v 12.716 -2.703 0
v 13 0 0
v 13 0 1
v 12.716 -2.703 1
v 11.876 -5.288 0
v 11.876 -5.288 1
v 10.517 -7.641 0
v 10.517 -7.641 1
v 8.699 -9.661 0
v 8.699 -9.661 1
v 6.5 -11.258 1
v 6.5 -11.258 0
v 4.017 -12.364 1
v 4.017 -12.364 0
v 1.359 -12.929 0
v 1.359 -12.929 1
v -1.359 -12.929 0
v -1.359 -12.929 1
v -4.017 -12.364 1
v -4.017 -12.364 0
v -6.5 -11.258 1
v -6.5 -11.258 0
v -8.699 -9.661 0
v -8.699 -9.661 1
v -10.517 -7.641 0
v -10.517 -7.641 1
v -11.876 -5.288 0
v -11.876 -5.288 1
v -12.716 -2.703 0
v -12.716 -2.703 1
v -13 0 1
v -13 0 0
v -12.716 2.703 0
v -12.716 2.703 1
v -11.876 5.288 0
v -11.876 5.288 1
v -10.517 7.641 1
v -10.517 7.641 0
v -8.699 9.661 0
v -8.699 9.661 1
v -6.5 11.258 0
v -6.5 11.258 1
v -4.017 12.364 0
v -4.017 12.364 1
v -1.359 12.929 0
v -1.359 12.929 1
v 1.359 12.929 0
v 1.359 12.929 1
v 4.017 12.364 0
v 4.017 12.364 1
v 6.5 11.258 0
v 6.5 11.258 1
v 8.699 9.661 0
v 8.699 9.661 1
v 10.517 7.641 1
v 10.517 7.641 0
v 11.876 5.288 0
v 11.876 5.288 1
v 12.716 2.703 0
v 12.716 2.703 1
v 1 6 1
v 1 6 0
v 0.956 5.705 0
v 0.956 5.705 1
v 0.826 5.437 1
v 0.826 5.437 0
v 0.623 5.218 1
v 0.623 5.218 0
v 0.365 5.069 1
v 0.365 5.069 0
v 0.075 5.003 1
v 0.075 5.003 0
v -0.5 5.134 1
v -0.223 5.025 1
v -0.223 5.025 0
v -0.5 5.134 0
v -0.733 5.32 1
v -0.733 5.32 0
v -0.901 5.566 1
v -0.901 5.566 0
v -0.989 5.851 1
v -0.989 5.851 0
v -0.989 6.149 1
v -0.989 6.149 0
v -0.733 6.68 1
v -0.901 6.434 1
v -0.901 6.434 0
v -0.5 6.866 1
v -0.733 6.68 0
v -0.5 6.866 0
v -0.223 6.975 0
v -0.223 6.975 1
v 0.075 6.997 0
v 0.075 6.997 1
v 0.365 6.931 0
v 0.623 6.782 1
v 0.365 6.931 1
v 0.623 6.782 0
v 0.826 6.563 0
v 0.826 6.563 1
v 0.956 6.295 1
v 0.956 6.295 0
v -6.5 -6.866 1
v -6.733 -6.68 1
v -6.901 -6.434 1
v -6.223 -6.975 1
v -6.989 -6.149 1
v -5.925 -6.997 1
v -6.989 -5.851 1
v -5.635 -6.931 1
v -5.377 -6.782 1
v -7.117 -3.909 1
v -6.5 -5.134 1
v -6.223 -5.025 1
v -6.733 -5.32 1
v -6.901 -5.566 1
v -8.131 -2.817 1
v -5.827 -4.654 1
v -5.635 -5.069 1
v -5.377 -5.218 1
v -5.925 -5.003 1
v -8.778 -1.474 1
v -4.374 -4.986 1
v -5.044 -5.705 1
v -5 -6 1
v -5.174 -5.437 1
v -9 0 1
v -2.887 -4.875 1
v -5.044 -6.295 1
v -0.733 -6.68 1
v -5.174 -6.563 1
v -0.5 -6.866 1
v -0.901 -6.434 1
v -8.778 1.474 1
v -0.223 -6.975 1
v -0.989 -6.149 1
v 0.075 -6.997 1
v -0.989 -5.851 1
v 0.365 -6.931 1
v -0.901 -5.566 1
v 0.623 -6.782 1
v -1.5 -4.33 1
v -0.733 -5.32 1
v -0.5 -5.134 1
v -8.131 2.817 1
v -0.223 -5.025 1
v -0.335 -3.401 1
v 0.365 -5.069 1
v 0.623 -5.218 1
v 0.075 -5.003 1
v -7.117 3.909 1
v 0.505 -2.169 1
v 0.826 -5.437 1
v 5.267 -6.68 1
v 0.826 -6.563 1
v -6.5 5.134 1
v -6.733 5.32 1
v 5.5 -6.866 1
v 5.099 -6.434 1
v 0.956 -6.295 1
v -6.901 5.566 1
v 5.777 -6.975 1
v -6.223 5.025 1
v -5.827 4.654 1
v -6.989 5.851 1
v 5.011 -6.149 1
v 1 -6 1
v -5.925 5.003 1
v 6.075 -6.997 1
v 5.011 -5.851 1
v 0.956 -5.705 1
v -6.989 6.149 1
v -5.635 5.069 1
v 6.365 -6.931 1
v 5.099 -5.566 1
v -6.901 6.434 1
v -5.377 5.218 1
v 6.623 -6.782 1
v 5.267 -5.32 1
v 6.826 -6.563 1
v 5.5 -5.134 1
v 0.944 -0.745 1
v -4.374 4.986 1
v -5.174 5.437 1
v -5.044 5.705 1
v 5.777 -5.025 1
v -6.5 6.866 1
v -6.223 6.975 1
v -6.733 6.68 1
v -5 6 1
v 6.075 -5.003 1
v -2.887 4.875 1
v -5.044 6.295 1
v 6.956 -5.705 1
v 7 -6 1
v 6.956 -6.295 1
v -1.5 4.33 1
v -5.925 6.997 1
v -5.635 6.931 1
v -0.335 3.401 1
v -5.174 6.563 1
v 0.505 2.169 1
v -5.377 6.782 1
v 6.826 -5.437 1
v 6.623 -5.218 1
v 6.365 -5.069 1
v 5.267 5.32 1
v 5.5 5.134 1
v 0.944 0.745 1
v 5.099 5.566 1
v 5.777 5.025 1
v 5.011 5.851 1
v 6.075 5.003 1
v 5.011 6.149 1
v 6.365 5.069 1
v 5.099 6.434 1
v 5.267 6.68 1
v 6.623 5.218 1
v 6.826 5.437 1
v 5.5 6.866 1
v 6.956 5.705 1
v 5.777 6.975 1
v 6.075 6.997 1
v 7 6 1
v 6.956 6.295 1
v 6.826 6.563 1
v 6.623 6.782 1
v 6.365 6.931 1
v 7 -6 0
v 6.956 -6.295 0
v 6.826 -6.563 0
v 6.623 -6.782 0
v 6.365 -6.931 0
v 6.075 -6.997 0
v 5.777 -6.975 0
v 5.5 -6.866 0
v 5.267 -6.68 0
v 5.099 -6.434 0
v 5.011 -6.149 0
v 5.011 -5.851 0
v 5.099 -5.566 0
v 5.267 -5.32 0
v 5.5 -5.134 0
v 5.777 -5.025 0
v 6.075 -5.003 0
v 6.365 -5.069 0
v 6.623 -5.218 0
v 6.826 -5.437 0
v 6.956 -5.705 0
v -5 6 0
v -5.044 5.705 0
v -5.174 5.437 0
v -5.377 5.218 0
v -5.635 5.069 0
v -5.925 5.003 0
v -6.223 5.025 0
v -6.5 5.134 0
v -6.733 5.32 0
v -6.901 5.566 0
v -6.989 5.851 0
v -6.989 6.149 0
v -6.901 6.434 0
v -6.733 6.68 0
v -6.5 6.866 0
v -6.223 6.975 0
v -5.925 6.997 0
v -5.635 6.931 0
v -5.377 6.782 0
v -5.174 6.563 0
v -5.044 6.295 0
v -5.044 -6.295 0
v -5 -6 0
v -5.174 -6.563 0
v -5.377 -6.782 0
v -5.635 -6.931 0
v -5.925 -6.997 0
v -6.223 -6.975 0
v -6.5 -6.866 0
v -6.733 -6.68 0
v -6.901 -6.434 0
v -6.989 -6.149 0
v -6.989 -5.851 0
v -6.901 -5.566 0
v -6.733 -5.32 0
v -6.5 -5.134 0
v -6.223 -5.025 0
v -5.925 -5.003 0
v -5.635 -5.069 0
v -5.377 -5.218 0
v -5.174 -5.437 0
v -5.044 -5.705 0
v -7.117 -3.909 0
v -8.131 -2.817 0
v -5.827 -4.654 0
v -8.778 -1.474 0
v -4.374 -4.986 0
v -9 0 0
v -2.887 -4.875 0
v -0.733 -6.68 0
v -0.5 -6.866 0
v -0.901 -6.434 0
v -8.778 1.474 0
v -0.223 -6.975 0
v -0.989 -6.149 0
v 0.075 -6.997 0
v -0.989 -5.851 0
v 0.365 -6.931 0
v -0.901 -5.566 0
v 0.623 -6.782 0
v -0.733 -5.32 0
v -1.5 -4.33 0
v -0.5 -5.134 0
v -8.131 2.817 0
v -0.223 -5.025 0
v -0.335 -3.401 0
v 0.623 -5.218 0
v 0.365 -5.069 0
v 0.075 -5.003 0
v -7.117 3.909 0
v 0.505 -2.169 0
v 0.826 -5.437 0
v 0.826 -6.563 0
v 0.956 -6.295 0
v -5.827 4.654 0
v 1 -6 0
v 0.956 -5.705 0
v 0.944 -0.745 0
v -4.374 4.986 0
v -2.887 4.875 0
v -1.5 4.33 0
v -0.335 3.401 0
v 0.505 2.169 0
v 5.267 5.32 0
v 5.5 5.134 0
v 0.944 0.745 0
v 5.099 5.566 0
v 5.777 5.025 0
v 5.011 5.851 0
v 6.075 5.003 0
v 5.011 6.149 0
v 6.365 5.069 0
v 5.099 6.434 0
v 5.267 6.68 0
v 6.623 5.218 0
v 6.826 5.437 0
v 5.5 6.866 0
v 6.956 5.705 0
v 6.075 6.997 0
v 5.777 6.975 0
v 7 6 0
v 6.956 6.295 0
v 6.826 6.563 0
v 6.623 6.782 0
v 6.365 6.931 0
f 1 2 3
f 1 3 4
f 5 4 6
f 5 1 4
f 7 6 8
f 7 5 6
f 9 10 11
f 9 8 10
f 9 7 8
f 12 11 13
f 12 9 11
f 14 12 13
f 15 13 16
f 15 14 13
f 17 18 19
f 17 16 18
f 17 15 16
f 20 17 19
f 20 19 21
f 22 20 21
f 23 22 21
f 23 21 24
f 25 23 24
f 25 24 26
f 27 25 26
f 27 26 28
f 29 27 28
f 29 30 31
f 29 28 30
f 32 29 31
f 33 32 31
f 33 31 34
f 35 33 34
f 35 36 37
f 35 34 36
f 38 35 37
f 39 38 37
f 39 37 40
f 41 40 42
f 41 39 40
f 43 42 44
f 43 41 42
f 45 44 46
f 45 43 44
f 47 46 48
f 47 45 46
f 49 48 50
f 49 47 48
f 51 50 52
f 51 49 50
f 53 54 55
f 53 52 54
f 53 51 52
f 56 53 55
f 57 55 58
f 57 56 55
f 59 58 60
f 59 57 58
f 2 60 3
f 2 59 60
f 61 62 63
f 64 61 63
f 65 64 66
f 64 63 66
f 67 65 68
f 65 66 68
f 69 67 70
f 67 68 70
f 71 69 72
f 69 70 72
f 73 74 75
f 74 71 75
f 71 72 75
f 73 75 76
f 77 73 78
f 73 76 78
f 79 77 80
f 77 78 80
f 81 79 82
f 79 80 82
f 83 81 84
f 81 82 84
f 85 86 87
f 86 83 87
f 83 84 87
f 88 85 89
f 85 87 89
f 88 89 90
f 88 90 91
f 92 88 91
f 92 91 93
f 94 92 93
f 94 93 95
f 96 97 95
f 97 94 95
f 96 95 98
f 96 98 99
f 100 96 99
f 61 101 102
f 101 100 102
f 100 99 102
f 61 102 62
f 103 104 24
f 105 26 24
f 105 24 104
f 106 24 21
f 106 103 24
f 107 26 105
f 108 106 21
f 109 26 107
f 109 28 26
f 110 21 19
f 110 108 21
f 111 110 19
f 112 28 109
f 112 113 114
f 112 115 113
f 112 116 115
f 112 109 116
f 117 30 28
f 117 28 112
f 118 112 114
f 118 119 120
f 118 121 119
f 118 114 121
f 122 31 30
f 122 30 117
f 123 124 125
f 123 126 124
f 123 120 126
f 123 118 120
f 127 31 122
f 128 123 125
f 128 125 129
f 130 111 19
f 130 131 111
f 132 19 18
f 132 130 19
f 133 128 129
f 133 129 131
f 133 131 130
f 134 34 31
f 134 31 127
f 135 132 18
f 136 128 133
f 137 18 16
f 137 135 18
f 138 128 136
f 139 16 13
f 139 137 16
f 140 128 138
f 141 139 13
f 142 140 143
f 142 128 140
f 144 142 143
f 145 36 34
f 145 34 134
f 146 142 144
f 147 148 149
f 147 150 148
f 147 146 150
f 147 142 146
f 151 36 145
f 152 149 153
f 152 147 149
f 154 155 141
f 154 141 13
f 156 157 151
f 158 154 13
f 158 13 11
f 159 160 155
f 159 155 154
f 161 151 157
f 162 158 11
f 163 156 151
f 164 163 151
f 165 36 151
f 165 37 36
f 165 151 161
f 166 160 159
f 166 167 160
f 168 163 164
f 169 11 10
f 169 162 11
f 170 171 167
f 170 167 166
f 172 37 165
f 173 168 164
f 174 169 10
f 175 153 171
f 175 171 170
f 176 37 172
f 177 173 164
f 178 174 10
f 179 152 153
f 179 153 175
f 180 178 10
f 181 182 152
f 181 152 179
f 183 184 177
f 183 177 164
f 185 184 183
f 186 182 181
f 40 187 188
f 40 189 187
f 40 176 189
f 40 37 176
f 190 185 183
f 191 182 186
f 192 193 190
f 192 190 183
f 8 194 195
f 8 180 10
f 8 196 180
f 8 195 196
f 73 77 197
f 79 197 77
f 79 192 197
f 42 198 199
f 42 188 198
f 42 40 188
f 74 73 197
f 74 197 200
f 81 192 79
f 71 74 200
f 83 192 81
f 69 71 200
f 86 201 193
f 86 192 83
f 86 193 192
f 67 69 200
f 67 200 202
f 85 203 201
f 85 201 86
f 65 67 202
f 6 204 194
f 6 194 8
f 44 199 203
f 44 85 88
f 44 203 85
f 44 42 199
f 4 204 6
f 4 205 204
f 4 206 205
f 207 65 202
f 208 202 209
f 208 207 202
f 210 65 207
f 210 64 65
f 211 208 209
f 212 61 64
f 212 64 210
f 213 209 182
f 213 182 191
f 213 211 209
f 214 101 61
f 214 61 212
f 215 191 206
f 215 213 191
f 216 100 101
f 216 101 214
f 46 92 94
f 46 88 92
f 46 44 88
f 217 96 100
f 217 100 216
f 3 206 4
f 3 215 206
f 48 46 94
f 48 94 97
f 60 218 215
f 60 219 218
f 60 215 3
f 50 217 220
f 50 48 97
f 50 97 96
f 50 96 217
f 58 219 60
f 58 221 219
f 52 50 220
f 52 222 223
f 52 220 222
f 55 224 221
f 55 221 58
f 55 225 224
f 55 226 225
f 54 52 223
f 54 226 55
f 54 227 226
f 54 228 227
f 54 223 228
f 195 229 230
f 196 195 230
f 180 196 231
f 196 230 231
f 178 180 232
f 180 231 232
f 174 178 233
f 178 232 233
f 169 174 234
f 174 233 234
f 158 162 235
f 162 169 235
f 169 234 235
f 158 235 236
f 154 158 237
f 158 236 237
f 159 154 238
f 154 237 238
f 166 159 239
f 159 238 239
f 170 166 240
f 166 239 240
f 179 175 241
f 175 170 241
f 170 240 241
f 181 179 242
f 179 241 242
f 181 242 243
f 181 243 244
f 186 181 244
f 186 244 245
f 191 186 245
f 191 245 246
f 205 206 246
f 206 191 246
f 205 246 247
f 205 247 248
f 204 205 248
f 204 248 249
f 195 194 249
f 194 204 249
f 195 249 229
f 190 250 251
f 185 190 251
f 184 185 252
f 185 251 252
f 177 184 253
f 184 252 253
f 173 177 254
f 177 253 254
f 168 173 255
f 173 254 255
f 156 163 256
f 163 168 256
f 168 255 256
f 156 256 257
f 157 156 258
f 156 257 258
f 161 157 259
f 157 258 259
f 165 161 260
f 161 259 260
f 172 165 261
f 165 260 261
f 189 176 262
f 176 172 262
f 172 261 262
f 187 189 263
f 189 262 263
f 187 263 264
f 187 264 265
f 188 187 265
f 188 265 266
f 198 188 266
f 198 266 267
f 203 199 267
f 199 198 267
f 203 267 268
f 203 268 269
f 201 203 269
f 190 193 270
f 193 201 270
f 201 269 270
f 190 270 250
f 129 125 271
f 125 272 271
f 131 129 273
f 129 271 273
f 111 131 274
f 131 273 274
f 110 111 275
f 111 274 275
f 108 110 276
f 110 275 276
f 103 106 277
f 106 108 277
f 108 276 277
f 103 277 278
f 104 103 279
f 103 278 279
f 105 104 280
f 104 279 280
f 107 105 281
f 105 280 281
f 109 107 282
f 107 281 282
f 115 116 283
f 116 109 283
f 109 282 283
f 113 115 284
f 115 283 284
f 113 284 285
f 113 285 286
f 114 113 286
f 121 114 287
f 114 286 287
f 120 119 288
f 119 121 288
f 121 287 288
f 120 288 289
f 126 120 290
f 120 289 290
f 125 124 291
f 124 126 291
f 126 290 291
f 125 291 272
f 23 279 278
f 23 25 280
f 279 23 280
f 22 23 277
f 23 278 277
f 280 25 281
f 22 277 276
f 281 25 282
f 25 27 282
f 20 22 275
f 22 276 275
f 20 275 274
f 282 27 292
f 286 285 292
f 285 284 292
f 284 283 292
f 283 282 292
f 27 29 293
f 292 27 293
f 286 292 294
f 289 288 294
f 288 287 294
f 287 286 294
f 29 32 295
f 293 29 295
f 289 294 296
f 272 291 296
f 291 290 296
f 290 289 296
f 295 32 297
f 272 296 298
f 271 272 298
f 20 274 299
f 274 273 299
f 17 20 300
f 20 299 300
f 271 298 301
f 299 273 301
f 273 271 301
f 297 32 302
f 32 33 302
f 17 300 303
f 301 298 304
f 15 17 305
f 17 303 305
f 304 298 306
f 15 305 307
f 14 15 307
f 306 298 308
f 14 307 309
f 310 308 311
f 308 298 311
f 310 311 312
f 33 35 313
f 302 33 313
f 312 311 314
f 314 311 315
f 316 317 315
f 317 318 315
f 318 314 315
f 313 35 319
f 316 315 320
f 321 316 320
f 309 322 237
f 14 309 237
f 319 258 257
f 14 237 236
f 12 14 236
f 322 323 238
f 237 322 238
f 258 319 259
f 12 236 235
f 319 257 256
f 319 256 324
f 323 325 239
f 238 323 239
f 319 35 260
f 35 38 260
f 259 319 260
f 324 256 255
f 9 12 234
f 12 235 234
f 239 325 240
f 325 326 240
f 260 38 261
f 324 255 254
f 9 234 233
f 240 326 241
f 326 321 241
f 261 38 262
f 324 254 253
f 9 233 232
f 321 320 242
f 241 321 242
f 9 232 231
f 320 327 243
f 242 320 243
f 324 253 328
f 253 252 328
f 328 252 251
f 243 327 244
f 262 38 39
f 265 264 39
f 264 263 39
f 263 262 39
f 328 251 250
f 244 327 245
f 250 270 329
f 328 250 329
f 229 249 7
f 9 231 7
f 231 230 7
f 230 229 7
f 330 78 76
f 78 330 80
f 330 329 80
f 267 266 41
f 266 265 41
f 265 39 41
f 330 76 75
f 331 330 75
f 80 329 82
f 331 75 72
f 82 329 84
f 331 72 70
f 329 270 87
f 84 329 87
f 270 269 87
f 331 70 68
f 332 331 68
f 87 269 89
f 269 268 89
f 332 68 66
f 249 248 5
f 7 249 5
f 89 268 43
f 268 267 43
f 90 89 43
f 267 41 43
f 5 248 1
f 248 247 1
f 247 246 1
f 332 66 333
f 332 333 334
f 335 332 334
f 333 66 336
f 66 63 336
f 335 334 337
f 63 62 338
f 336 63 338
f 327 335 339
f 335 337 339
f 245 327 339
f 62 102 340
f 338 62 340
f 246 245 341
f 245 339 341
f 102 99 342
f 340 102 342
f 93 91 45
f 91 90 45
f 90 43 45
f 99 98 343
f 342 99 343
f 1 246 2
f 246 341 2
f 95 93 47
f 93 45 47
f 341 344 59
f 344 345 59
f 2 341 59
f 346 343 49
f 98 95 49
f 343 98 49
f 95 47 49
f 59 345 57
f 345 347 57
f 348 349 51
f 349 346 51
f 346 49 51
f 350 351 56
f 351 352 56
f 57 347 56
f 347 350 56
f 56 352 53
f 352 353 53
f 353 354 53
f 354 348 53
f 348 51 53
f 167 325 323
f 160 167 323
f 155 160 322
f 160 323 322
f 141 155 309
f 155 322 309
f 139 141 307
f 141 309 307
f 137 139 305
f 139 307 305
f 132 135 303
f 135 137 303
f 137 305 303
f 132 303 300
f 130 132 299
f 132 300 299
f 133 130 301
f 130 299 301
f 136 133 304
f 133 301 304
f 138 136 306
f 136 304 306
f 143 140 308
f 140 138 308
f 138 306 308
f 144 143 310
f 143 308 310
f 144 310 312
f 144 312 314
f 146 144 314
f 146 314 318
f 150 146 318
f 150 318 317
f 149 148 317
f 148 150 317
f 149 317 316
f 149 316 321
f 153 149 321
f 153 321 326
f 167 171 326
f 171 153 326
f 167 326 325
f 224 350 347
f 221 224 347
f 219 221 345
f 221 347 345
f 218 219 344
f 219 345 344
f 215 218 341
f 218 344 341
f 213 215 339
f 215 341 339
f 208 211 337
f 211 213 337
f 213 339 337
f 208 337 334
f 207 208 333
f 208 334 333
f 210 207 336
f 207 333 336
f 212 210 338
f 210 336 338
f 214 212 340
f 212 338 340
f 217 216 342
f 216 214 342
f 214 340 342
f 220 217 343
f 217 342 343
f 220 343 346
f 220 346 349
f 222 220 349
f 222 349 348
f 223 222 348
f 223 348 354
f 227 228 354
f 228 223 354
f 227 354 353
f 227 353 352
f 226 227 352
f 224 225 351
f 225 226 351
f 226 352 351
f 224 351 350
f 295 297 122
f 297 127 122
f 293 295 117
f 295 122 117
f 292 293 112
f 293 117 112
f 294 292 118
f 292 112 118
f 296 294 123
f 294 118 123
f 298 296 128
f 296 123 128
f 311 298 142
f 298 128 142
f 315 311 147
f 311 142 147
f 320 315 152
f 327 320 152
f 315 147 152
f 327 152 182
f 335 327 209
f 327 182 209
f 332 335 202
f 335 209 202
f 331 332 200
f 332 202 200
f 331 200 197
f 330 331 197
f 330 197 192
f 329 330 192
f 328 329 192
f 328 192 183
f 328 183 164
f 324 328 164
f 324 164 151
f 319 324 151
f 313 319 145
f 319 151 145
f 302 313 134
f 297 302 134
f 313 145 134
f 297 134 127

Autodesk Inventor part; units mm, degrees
ref_plane "YZ Plane" through (0, 0, 0) normal (1, 0, 0) x (0, 1, 0)
ref_plane "XZ Plane" through (0, 0, 0) normal (0, 1, 0) x (-1, 0, 0)
ref_plane "XY Plane" through (0, 0, 0) normal (0, 0, 1) x (1, 0, 0)
sketch "Sketch1" plane through (0, 0, 0) normal (0, 0, 1) x (1, 0, 0)
  circle A0 centre (0, 0) radius 13
  circle A1 centre (-6, 6) radius 1
  circle A2 centre (0, 6) radius 1
  circle A3 centre (6, 6) radius 1
  circle A4 centre (6, -6) radius 1
  circle A5 centre (0, -6) radius 1
  circle A6 centre (-6, -6) radius 1
  dimension "d0" = 26
  dimension "d2" = 2
  dimension "d3" = 12
  dimension "d4" = 6
  dimension "d5" = 12
  dimension "d6" = 6
  dimension "d7" = 6
  dimension "d8" = 2
extrude "Extrusion1" add sketch "Sketch1" along normal blind 1
sketch "Sketch2" plane through (0, 0, 1) normal (0, 0, -1) x (-1, 0, 0)
  circle A0 centre (4, 0) radius 5
  circle A1 centre (0, 6) radius 1 projected
  point P0 (0, 0)
  dimension "d11" = 10
  dimension "d12" = 4
extrude "Extrusion2" cut sketch "Sketch2" along normal blind 18 contours A0
equation "\"d4\" = 0.5 * d3"
equation "\"d6\" = 0.5 * d5"
properties part number "12"
